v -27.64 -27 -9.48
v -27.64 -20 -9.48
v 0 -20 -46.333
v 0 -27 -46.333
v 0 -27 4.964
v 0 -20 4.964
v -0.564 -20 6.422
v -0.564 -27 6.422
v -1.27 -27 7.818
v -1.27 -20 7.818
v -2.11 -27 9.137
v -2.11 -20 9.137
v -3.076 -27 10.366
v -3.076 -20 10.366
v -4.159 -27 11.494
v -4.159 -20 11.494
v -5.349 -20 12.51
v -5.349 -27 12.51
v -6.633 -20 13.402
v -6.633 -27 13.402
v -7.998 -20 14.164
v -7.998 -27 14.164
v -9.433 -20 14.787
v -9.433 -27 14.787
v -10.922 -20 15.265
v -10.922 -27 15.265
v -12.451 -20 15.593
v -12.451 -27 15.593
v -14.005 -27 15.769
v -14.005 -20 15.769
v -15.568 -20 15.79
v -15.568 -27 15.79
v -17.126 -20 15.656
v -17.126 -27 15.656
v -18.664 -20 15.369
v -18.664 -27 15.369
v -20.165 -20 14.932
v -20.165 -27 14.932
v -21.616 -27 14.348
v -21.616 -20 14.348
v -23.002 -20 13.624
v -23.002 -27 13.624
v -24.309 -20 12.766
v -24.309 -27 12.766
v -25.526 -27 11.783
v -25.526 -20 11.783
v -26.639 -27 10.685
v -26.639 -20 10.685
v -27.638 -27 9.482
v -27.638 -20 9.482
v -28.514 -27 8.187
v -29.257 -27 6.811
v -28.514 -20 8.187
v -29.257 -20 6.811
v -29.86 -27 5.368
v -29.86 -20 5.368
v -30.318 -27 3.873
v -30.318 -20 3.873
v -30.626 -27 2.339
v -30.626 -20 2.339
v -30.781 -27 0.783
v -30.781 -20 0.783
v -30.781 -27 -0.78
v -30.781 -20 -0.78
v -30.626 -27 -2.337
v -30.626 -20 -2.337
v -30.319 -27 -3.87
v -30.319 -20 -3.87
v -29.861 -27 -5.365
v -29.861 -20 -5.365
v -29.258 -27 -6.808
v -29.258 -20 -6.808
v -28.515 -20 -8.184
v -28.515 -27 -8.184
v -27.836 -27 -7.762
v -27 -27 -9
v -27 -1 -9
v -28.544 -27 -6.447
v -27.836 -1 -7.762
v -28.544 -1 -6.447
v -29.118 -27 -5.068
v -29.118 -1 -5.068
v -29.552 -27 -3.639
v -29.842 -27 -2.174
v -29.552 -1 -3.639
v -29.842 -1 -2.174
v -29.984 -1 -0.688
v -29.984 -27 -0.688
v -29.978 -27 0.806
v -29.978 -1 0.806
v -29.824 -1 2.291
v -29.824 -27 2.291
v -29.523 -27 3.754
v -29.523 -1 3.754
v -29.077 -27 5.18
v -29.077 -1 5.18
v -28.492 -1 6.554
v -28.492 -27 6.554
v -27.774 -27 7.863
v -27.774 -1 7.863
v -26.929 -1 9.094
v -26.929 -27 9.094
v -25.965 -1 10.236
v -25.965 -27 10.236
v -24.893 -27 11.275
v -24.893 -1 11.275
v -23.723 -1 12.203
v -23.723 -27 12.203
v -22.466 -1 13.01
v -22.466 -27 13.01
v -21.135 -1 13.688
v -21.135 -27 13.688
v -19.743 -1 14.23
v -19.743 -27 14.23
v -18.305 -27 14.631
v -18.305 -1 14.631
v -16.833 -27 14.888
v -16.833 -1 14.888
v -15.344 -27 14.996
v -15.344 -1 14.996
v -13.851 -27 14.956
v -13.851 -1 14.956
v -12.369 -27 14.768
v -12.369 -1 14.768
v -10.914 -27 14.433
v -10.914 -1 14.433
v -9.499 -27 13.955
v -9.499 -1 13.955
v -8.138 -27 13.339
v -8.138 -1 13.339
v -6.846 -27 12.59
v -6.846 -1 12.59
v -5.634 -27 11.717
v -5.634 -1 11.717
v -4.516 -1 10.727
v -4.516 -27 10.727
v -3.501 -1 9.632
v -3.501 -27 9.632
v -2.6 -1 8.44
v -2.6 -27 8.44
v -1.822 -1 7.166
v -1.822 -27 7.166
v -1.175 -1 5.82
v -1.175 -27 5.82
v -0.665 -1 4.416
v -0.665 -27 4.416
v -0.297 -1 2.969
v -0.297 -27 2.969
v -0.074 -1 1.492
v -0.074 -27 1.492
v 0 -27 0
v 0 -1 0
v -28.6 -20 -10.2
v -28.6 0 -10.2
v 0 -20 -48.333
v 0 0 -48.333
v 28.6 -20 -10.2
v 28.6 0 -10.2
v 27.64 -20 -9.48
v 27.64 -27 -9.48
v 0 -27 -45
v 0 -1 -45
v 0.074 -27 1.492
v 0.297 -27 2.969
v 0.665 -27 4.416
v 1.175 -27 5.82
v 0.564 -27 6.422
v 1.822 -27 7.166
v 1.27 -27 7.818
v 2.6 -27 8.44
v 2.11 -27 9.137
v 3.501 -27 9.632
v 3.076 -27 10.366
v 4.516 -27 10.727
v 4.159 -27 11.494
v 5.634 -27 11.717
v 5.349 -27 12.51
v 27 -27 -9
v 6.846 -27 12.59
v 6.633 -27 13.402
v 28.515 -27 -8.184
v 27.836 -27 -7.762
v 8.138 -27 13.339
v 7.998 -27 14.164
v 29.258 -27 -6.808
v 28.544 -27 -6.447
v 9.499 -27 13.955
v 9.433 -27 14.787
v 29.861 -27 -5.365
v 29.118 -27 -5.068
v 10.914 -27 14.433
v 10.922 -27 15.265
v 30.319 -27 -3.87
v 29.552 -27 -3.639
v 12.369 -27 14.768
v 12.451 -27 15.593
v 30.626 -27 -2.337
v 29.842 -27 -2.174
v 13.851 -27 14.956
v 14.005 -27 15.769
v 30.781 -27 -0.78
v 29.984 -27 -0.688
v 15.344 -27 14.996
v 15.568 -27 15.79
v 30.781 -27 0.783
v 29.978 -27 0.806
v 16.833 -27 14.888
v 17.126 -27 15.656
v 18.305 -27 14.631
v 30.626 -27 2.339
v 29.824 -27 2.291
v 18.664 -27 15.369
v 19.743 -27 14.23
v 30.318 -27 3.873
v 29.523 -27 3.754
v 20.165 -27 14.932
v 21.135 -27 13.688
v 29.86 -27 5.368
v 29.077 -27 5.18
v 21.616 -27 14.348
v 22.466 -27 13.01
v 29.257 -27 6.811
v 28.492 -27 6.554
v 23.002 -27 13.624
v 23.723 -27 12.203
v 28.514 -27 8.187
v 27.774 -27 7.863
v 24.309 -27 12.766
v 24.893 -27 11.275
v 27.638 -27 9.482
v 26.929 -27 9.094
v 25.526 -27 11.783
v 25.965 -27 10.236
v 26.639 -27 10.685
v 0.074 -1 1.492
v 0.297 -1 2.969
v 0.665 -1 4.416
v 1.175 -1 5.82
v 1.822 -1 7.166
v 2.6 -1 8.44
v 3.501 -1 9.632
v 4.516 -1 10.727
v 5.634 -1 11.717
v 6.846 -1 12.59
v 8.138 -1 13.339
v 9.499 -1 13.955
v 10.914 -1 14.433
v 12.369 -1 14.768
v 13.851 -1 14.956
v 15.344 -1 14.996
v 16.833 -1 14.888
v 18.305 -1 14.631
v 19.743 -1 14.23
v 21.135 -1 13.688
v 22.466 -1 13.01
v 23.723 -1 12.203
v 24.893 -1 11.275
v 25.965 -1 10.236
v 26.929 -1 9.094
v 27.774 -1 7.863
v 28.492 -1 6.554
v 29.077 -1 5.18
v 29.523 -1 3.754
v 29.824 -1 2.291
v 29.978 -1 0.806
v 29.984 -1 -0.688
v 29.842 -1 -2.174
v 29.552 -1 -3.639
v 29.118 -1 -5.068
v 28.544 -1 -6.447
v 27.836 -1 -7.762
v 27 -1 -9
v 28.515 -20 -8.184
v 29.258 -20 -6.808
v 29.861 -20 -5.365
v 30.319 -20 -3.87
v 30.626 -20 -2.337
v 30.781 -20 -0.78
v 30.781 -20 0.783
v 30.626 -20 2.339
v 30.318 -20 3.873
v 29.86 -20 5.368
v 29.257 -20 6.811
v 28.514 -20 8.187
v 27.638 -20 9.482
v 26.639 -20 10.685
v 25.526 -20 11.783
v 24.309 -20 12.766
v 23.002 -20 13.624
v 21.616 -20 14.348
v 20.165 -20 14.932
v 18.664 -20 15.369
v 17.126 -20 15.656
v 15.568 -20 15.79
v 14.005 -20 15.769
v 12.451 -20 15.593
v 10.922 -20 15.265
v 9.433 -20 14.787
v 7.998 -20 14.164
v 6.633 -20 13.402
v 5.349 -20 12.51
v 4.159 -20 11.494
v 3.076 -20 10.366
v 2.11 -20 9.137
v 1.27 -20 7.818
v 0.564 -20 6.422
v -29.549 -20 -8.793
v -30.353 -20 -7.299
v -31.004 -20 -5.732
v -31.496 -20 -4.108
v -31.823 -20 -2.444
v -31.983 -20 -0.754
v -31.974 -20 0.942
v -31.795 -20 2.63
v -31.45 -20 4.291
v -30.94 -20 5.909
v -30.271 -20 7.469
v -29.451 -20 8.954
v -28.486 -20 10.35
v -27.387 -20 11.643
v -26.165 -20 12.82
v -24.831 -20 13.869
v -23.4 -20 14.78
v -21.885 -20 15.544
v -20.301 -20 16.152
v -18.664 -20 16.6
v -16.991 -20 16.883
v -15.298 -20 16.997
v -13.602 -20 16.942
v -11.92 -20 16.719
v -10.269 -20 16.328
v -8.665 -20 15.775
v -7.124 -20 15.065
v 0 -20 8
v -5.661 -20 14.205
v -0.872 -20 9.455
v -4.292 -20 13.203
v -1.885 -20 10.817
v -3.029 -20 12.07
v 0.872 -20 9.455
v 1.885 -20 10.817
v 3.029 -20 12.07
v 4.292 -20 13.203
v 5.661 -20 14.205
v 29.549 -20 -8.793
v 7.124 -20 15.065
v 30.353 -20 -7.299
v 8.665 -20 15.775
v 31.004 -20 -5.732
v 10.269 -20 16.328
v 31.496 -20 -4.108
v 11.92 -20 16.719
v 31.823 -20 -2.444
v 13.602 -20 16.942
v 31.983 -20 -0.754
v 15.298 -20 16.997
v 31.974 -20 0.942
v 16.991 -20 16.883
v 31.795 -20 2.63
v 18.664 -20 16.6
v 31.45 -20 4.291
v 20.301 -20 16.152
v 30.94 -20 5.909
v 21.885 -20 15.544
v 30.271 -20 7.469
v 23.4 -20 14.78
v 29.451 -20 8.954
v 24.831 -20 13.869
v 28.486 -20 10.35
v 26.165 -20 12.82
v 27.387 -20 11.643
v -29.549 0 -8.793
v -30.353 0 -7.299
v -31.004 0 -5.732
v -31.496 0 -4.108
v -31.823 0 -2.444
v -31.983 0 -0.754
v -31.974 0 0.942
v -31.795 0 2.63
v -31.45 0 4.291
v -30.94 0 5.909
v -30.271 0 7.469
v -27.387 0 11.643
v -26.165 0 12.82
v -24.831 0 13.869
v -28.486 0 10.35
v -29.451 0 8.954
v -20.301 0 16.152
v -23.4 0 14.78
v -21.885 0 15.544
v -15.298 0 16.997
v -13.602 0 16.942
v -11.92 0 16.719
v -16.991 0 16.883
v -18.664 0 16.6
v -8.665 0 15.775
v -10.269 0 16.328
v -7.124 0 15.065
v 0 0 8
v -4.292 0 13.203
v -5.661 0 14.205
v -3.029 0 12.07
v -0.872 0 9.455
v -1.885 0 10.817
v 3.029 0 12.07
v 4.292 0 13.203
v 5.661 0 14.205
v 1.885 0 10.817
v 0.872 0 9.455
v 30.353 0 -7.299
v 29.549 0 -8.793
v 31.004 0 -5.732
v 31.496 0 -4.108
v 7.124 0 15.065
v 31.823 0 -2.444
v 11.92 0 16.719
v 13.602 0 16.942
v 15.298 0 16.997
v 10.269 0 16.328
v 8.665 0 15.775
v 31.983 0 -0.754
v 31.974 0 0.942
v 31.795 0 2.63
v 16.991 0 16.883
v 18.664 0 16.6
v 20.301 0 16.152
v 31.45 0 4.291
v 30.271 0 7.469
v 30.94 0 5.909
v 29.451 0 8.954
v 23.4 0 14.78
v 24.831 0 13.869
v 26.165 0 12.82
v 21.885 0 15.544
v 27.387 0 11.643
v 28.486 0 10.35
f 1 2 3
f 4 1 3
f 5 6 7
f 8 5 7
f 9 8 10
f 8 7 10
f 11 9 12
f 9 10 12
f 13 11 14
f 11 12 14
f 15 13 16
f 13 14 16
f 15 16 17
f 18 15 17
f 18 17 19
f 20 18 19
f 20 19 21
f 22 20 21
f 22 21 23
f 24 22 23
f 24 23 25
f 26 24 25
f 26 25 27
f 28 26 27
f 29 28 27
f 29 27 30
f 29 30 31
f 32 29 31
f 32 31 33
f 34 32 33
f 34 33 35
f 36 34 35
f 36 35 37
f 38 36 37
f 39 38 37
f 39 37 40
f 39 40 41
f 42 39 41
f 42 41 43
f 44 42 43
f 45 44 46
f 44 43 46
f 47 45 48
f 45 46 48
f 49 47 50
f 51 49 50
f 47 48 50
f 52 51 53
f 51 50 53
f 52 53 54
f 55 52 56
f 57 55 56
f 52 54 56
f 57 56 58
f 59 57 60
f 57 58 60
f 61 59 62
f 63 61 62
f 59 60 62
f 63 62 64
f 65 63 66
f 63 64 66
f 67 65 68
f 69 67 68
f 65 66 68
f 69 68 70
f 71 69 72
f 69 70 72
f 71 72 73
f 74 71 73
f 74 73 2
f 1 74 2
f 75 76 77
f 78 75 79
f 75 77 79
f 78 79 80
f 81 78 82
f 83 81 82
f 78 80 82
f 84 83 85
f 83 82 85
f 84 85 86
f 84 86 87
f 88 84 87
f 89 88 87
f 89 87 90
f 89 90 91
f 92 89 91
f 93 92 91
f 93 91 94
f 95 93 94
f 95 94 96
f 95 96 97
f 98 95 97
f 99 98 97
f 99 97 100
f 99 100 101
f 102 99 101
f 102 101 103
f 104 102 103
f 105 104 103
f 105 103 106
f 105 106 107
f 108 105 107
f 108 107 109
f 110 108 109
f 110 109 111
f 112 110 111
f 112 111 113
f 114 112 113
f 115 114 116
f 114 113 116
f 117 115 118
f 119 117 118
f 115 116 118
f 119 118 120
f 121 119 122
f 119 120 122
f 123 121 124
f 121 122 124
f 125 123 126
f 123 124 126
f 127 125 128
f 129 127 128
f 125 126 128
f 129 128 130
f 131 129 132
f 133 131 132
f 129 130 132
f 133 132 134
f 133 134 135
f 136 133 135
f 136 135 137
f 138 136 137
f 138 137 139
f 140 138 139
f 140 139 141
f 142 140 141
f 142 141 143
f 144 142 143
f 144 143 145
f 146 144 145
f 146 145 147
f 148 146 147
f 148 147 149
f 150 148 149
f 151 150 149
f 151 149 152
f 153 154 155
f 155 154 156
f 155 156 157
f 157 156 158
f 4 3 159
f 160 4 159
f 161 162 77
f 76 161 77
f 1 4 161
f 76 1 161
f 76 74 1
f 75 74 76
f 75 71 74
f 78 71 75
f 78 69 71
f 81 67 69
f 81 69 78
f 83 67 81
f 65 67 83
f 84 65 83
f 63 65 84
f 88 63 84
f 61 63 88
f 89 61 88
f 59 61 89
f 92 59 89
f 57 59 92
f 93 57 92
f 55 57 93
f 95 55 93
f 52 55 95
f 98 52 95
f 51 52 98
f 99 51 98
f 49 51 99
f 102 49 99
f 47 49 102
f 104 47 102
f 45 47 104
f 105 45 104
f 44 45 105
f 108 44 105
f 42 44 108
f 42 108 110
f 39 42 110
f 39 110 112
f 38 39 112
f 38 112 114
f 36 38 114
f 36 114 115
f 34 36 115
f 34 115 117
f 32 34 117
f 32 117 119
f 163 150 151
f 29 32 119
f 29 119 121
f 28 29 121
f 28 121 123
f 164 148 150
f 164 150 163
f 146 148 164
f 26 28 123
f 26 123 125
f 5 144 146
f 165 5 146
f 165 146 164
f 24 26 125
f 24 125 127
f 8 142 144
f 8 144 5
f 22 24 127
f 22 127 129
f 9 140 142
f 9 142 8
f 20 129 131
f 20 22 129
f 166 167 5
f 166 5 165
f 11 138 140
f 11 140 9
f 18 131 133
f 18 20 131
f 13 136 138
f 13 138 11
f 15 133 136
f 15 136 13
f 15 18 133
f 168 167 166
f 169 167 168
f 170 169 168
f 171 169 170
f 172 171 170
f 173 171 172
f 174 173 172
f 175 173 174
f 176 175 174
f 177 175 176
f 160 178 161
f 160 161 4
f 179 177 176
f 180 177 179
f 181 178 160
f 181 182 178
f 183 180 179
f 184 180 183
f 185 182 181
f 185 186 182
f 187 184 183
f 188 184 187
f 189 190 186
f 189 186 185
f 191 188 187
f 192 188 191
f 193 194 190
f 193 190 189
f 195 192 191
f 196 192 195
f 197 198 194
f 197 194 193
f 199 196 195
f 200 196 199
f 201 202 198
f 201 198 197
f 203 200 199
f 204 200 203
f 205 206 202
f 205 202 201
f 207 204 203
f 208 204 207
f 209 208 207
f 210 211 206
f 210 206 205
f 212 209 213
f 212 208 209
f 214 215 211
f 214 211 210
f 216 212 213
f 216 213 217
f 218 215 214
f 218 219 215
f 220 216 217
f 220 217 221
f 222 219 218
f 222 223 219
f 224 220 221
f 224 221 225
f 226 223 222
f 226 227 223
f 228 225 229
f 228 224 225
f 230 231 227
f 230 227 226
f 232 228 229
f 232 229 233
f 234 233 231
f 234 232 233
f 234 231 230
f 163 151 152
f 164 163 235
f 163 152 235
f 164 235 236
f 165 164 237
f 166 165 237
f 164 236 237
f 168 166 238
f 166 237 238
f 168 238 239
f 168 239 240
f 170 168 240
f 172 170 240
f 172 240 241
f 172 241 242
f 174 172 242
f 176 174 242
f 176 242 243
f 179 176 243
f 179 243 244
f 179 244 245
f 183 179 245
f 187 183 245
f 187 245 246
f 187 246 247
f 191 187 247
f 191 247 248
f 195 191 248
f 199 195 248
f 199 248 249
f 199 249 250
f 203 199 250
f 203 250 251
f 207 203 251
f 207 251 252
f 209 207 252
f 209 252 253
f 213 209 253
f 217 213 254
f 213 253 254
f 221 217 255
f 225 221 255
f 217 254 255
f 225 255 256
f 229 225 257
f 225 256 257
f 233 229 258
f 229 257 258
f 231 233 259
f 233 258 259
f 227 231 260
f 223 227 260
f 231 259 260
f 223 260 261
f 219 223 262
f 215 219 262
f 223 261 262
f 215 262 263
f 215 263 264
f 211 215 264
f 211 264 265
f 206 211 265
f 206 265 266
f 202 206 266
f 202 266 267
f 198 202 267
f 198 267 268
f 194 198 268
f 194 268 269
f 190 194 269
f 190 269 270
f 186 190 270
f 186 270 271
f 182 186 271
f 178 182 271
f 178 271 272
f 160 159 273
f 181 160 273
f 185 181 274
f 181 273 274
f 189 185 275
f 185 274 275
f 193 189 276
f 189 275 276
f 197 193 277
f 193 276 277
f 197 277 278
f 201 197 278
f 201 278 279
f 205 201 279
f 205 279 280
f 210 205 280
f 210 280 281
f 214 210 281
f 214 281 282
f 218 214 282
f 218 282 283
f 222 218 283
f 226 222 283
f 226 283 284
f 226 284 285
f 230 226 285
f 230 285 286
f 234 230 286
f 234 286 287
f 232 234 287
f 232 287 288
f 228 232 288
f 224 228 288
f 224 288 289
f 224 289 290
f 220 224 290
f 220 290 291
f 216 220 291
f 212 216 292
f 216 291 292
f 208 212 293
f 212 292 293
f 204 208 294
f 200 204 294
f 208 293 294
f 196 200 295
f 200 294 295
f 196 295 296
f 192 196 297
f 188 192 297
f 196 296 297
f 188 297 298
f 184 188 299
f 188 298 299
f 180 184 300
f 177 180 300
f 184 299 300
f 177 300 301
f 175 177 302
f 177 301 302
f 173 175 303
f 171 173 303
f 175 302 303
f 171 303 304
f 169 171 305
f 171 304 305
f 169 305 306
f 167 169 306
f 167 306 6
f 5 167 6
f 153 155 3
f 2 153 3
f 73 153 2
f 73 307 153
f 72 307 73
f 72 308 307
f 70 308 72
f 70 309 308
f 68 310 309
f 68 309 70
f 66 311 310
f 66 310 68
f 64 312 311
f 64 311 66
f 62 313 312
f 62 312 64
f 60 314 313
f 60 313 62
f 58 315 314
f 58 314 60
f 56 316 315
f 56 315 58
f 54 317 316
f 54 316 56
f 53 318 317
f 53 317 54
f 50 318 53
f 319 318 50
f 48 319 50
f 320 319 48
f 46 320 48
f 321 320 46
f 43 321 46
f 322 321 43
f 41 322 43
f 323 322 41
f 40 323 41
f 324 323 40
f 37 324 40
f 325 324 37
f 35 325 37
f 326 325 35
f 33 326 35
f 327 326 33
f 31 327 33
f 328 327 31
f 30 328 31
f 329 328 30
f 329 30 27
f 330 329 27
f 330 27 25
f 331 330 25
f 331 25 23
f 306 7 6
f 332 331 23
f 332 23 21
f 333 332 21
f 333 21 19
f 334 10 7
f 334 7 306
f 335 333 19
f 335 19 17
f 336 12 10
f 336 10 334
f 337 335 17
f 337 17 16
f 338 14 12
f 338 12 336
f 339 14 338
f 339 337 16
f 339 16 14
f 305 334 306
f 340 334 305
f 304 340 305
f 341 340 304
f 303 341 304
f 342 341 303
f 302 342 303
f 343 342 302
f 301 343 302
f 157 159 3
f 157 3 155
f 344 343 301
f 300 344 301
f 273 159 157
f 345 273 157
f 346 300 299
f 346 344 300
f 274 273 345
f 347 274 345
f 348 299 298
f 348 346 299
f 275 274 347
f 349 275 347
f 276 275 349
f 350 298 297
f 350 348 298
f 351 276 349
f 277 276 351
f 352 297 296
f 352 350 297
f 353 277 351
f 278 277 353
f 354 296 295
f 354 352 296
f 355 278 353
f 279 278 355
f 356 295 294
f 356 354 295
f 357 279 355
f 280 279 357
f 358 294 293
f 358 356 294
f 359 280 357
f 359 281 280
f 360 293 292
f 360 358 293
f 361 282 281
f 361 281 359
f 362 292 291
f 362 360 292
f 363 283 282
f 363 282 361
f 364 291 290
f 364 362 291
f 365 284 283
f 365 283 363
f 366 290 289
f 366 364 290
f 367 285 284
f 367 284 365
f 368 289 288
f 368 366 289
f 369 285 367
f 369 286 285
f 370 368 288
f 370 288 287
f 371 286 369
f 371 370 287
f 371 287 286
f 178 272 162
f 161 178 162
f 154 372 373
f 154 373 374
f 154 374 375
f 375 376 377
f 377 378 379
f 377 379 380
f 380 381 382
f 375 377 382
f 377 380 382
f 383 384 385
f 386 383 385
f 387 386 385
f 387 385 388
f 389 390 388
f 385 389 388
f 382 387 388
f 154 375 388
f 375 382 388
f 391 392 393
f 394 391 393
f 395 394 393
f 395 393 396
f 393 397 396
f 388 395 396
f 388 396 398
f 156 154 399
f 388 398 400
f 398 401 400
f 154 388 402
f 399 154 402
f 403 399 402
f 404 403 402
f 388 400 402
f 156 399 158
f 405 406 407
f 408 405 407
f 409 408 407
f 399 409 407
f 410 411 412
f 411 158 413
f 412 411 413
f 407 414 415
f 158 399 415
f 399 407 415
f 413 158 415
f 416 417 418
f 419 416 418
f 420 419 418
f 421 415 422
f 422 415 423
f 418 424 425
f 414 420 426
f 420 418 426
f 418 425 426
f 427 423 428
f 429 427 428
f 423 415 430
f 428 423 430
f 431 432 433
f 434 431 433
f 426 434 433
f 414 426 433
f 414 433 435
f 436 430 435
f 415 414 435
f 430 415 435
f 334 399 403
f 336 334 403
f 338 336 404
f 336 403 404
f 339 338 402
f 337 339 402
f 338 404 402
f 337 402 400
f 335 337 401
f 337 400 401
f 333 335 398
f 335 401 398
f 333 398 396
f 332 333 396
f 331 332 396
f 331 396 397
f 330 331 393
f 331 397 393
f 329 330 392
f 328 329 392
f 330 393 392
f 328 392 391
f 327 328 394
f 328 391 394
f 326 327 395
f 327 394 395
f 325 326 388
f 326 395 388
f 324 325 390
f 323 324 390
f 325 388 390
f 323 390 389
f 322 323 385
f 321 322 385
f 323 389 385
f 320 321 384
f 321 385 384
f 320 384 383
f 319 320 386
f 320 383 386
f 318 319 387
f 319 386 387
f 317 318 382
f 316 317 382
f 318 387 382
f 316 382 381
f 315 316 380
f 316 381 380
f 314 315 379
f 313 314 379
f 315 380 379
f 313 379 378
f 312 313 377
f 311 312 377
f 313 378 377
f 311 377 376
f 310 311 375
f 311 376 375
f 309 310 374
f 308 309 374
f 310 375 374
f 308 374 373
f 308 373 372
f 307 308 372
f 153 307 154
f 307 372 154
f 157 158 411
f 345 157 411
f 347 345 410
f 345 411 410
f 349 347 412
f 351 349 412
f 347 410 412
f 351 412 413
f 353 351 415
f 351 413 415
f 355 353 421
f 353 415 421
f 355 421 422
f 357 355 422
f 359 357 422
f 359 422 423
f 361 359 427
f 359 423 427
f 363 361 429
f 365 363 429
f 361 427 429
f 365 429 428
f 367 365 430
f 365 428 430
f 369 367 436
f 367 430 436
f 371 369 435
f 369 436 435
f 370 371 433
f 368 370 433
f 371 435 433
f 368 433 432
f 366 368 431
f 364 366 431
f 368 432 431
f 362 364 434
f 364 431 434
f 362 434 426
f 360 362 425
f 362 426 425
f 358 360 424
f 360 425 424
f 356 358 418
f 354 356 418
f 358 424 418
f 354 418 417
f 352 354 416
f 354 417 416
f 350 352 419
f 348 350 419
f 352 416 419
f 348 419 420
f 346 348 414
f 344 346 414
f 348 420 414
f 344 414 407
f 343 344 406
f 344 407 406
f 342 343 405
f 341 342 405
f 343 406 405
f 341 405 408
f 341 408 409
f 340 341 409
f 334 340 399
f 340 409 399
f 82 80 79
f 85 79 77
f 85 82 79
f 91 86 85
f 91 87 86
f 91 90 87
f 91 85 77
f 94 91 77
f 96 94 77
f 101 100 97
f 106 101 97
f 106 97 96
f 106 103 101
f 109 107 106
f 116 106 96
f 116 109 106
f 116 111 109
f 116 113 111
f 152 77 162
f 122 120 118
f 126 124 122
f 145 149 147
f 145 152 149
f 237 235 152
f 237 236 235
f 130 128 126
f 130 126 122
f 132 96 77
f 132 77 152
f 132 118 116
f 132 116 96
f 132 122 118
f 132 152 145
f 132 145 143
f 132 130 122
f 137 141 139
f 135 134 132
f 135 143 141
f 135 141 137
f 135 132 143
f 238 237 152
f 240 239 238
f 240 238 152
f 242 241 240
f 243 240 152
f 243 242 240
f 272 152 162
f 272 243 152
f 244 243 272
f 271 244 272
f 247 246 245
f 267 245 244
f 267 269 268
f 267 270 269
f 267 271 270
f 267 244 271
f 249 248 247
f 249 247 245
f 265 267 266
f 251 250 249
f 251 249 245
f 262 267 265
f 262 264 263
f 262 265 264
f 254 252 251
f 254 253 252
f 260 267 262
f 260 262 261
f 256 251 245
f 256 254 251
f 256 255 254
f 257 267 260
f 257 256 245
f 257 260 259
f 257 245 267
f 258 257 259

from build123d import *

# Parameters (mm, degrees)
F1_DEPTH = 1
F2_DEPTH = 20
F3_DEPTH = 27


with BuildPart() as f1:
    # F0 (on Front) → F1 (new body)
    with BuildSketch(Plane.XZ):
        with BuildLine():
            ThreePointArc((28.6, -10.2), (24.1268833673, 14.3422452914), (0, 8))
            ThreePointArc((0, 8), (-24.1268833673, 14.3422452914), (-28.6, -10.2))
            Line((-28.6, -10.2), (0, -48.3333333333))
            Line((0, -48.3333333333), (28.6, -10.2))
        make_face()
        with BuildLine():
            ThreePointArc((-27.64, -9.48), (-22.3177005427, 14.0032588624), (0, 4.9638694584))
            ThreePointArc((0, 4.9638694584), (22.3177005427, 14.0032588624), (27.64, -9.48))
            Line((27.64, -9.48), (0, -46.3333333333))
            Line((0, -46.3333333333), (-27.64, -9.48))
        make_face(mode=Mode.SUBTRACT)
        with BuildLine():
            ThreePointArc((27.64, -9.48), (22.3177005427, 14.0032588624), (0, 4.9638694584))
            ThreePointArc((0, 4.9638694584), (-22.3177005427, 14.0032588624), (-27.64, -9.48))
            Line((-27.64, -9.48), (0, -46.3333333333))
            Line((0, -46.3333333333), (27.64, -9.48))
        make_face()
        with BuildLine():
            ThreePointArc((-27, -9), (-19.7434164903, 14.2302494708), (0, 0))
            ThreePointArc((0, 0), (19.7434164903, 14.2302494708), (27, -9))
            Line((27, -9), (0, -45))
            Line((0, -45), (-27, -9))
        make_face(mode=Mode.SUBTRACT)
        with BuildLine():
            ThreePointArc((27, -9), (19.7434164903, 14.2302494708), (0, 0))
            ThreePointArc((0, 0), (-19.7434164903, 14.2302494708), (-27, -9))
            Line((-27, -9), (0, -45))
            Line((0, -45), (27, -9))
        make_face()
    extrude(amount=F1_DEPTH)

    # F0 (on Front) → F2 (join)
    with BuildSketch(Plane.XZ):
        with BuildLine():
            ThreePointArc((28.6, -10.2), (24.1268833673, 14.3422452914), (0, 8))
            ThreePointArc((0, 8), (-24.1268833673, 14.3422452914), (-28.6, -10.2))
            Line((-28.6, -10.2), (0, -48.3333333333))
            Line((0, -48.3333333333), (28.6, -10.2))
        make_face()
        with BuildLine():
            ThreePointArc((-27.64, -9.48), (-22.3177005427, 14.0032588624), (0, 4.9638694584))
            ThreePointArc((0, 4.9638694584), (22.3177005427, 14.0032588624), (27.64, -9.48))
            Line((27.64, -9.48), (0, -46.3333333333))
            Line((0, -46.3333333333), (-27.64, -9.48))
        make_face(mode=Mode.SUBTRACT)
    extrude(amount=F2_DEPTH)

    # F0 (on Front) → F3 (join)
    with BuildSketch(Plane.XZ):
        with BuildLine():
            ThreePointArc((27.64, -9.48), (22.3177005427, 14.0032588624), (0, 4.9638694584))
            ThreePointArc((0, 4.9638694584), (-22.3177005427, 14.0032588624), (-27.64, -9.48))
            Line((-27.64, -9.48), (0, -46.3333333333))
            Line((0, -46.3333333333), (27.64, -9.48))
        make_face()
        with BuildLine():
            ThreePointArc((-27, -9), (-19.7434164903, 14.2302494708), (0, 0))
            ThreePointArc((0, 0), (19.7434164903, 14.2302494708), (27, -9))
            Line((27, -9), (0, -45))
            Line((0, -45), (-27, -9))
        make_face(mode=Mode.SUBTRACT)
    extrude(amount=F3_DEPTH)


solid = f1.part
